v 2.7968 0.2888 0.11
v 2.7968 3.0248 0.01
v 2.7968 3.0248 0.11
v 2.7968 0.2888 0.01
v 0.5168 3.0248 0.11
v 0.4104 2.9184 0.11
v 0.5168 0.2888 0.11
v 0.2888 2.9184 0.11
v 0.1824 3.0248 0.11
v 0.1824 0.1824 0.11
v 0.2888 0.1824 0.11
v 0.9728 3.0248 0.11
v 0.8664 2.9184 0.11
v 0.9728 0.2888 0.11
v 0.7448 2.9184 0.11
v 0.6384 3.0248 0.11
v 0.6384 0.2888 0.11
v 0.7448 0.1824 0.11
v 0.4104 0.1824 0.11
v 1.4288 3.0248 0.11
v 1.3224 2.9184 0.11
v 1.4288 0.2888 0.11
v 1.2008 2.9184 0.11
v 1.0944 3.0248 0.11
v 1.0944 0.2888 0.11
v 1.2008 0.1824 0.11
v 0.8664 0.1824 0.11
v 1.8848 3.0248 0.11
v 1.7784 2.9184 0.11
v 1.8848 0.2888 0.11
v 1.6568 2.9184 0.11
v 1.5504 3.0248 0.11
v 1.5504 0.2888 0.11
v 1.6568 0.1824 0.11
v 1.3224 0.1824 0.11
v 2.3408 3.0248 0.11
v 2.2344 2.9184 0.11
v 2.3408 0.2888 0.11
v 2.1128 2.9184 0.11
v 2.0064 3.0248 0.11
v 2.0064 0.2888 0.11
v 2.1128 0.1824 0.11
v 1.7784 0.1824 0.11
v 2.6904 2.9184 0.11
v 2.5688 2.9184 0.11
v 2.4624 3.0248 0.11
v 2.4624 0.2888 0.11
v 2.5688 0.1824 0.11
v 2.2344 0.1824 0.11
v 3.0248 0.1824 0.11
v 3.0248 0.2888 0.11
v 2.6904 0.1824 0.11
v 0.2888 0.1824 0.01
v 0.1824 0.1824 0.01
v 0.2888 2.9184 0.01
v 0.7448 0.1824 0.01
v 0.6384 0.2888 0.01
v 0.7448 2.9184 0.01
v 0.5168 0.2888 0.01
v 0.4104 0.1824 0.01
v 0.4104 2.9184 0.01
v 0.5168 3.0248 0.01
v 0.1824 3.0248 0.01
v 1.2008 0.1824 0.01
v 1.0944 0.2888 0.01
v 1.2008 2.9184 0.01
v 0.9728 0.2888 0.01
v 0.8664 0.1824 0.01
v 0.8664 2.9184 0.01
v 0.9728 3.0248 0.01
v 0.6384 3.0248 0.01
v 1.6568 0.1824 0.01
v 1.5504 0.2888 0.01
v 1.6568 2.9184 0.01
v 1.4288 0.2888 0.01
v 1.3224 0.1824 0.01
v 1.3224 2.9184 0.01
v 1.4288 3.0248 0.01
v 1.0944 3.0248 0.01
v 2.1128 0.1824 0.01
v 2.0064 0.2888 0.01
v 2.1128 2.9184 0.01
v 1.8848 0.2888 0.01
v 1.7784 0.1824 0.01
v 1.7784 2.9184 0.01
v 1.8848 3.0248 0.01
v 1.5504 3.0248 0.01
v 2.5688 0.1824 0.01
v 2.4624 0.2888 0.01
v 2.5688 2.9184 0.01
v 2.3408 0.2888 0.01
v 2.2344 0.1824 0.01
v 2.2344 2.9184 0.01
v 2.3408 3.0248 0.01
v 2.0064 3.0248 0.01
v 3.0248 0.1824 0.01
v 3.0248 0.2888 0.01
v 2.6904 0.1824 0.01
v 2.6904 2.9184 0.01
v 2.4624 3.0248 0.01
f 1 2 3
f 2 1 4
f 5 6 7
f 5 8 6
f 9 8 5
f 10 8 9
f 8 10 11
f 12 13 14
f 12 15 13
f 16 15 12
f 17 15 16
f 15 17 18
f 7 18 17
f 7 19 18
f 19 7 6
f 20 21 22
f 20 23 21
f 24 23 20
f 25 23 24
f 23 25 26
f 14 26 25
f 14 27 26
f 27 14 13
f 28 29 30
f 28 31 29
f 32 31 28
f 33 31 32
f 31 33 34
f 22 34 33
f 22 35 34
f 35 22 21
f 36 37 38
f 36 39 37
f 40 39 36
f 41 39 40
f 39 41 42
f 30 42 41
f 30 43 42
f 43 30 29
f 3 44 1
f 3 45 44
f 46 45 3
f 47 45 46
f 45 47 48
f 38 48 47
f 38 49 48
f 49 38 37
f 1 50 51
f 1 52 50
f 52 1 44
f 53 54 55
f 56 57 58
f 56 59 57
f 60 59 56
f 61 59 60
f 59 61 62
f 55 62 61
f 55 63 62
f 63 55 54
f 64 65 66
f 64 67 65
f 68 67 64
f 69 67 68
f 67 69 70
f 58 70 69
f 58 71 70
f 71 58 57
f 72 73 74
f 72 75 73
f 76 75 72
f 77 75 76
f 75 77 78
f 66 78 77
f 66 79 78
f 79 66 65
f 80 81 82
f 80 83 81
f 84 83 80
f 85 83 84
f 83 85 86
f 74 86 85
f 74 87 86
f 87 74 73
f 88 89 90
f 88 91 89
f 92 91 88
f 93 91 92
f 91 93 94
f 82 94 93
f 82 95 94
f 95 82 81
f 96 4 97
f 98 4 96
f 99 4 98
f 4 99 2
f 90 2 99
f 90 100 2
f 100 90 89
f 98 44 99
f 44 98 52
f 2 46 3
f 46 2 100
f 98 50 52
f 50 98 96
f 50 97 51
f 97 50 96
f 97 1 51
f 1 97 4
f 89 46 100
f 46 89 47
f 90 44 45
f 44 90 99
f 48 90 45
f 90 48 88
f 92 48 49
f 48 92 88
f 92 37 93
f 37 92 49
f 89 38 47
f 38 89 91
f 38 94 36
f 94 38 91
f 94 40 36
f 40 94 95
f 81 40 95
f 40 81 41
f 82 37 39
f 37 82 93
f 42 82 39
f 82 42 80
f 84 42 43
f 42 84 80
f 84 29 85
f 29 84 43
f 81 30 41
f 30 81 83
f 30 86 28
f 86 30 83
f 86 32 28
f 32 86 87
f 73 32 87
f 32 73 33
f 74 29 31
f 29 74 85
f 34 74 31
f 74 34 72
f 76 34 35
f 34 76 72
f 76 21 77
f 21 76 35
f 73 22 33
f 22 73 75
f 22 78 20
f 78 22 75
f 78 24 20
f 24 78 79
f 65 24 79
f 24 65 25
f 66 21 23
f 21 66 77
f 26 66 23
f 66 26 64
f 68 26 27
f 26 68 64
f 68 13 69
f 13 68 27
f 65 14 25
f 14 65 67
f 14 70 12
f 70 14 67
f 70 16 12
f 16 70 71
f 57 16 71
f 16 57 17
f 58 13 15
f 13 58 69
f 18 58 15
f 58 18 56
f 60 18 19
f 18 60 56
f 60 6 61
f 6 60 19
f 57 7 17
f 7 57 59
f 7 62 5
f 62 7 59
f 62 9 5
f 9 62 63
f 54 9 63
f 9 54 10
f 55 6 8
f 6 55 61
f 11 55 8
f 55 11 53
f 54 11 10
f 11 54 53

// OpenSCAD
use <routing.scad>

px = 7.6e-3;
layer = 10e-3;
lpv = 20;

module valve_20px_1(xpos, ypos, zpos, orientation)
{
    
    // Parameteres
    h_fluid = 2*layer;
    t_memb = layer;
    h_air = 4*layer;
    h_total = h_fluid + t_memb + h_air; // 7*layer
    d_valve = 20*px;
    
    // Valve connection channels
    xychan0 = 6*px;
    xychan = 8*px;
    hchan = 5*layer;
    hchan_px = 8*px;
    wchan = 8*px;

    dimm        =   [  
                        [[0, 0], [-wchan/2, wchan/2], [0, hchan]], // 0
                        [[-wchan/2, wchan/2], [0, 0], [0, hchan]], // 1
                        [[-xychan/2, xychan/2], [-xychan/2, xychan/2], [0, 0]], // 2
                        [[-xychan0/2, xychan0/2], [-xychan0/2, xychan0/2], [0, 0]], // 3
                        [[-xychan/2, xychan/2], [0, hchan_px], [0, 0]], // 4
                    ];
                    
    overlap_v_xy  = 2*px;
    
    module obj(){
        // Fluid compartment
        color("CadetBlue")
        cylinder(d = d_valve, h = h_fluid);
        
        // Air compartment
        color("SteelBlue")
        translate([0,0,h_fluid + t_memb])
        cylinder(d = d_valve, h = h_air);    
            
        // Fluid in channel connection
        pt_fluid_in         = [0, -d_valve/2 + overlap_v_xy, 1*layer - hchan];
        pt_fluid_in_next    = [
                                ["+y", -21*px, 1],
                              ];
        color("Blue")
        routing(pt_fluid_in,pt_fluid_in_next, dimm);
        
        // Fluid out channel connection
        pt_fluid_out        = [0, d_valve/2 - overlap_v_xy, 1*layer - hchan];
        pt_fluid_out_next   = [
                                ["+y", 21*px, 1],
                              ];
        color("Red")
        routing(pt_fluid_out,pt_fluid_out_next, dimm);
        
        // Air control channel connection
        pt_air_control      = [-d_valve/2 - xychan/2 + 6*px, 0, h_total];
        pt_air_control_next = [
                                ["+zx", [9*layer, -21*px]],
                              ];
        
        color("Red")
        routing(pt_air_control,pt_air_control_next, dimm);
        
        // Air flushing channel connection
        pt_air_flush        = [d_valve/2 + xychan/2 - 6*px, 0, h_total];
        pt_air_flush_next   = [
                                ["+zx", [9*layer, 21*px]],
                              ];
        color("Blue")
        routing(pt_air_flush,pt_air_flush_next, dimm);
    }
    
    if (orientation == "N"){
        rotate(270)
        translate([-25*px*2 - ypos*px, 30*px*2 + xpos*px, 4*layer + zpos*layer])
        obj();
    }
    if (orientation == "FN"){
        mirror([1, 0 , 0])
        rotate(270)
        translate([-25*px*2 - ypos*px, -30*px*2 - xpos*px, 4*layer + zpos*layer])
        obj();
    }
    if (orientation == "FS"){
        mirror([0, 1, 0])
        rotate(270)
        translate([25*px*2 + ypos*px, 30*px*2 + xpos*px, 4*layer + zpos*layer])
        obj();
    }
    if (orientation == "S"){
        mirror([0, 1, 0])
        mirror([1, 0 , 0])
        rotate(270)
        translate([25*px*2 + ypos*px, -30*px*2 - xpos*px, 4*layer + zpos*layer])
        obj();
    }
    
}
module valve_20px4way_0(xpos, ypos, zpos, orientation)
{
    
    // Parameteres
    h_fluid = 2*layer;
    t_memb = layer;
    h_air = 4*layer;
    h_total = h_fluid + t_memb + h_air; // 7*layer
    d_valve = 20*px;
    
    // Valve connection channels
    xychan0 = 6*px;
    xychan = 8*px;
    hchan = 5*layer;
    hchan_px = 8*px;
    wchan = 8*px;

    dimm        =   [  
                        [[0, 0], [-wchan/2, wchan/2], [0, hchan]], // 0
                        [[-wchan/2, wchan/2], [0, 0], [0, hchan]], // 1
                        [[-xychan/2, xychan/2], [-xychan/2, xychan/2], [0, 0]], // 2
                        [[-xychan0/2, xychan0/2], [-xychan0/2, xychan0/2], [0, 0]], // 3
                        [[-xychan/2, xychan/2], [0, hchan_px], [0, 0]], // 4
                    ];
                    
    overlap_v_xy  = 2*px;
    
    module obj(){
        // Fluid compartment
        color("CadetBlue")
        cylinder(d = d_valve, h = h_fluid);
        
        // Air compartment
        color("SteelBlue")
        translate([0,0,h_fluid + t_memb])
        cylinder(d = d_valve, h = h_air);    
            
        // Fluid in channel connection
        pt_fluid_in         = [0, -d_valve/2 + overlap_v_xy, 1*layer - hchan];
        pt_fluid_in_next    = [
                                ["+y", -21*px, 1],
                              ];
        color("Blue")
        routing(pt_fluid_in,pt_fluid_in_next, dimm);
        
        // Fluid out channel connection
        pt_fluid_out        = [0, d_valve/2 - overlap_v_xy, 1*layer - hchan];
        pt_fluid_out_next   = [
                                ["+y", 21*px, 1],
                              ];
        color("Red")
        routing(pt_fluid_out,pt_fluid_out_next, dimm);
        
        rotate(90){
            // Fluid in channel connection
            pt_fluid_in         =   [0, -d_valve/2 + overlap_v_xy, 1*layer - hchan];
            pt_fluid_in_next    =   [
                                        ["+y", -21*px, 1],
                                    ];
            
            routing(pt_fluid_in,pt_fluid_in_next, dimm);
        
            // Fluid out channel connection
            pt_fluid_out        =   [0, d_valve/2 - overlap_v_xy, 1*layer - hchan];
            pt_fluid_out_next   =   [
                                        ["+y", 21*px, 1],
                                    ];
            
            routing(pt_fluid_out,pt_fluid_out_next, dimm);
        }
        
        // Air control channel connection
        pt_air_control      = [-d_valve/2 - xychan/2 + 6*px, 0, h_total];
        pt_air_control_next = [
                                ["+zx", [9*layer, -21*px]],
                              ];
        
        color("Red")
        routing(pt_air_control,pt_air_control_next, dimm);
        
        // Air flushing channel connection
        pt_air_flush        = [d_valve/2 + xychan/2 - 6*px, 0, h_total];
        pt_air_flush_next   = [
                                ["+zx", [9*layer, 21*px]],
                              ];
        color("Blue")
        routing(pt_air_flush,pt_air_flush_next, dimm);
    }
    
    if (orientation == "N"){
        rotate(270)
        translate([-25*px*2 - ypos*px, 25*px*2 + xpos*px, 4*layer + zpos*layer])
        obj();
    }
    if (orientation == "FN"){
        mirror([1, 0 , 0])
        rotate(270)
        translate([-25*px*2 - ypos*px, -25*px*2 - xpos*px, 4*layer + zpos*layer])
        obj();
    }
    if (orientation == "FS"){
        mirror([0, 1, 0])
        rotate(270)
        translate([25*px*2 + ypos*px, 25*px*2 + xpos*px, 4*layer + zpos*layer])
        obj();
    }
    if (orientation == "S"){
        mirror([0, 1, 0])
        mirror([1, 0 , 0])
        rotate(270)
        translate([25*px*2 + ypos*px, -25*px*2 - xpos*px, 4*layer + zpos*layer])
        obj();
    }
    
}
module serpentine_300px_0(xpos, ypos, zpos, orientation)
{
    
    // Sub-modules
    module obj(){
        translate([23*px, 23*px, 0])       
        routing(
            dimm = [
                    [[0, 0], [0, 14*px], [0, 10*layer]],
                    [[0, 14*px], [0, 0], [0, 10*layer]]
                    ],
            p0 = [0, 0, 0],
            pf = [
                    ["+yx", [360*px, 30*px], [1, 0]],
                    ["+yx", [-360*px, 30*px], [1, 0]],
                    ["+yx", [360*px, 30*px], [1, 0]],
                    ["+yx", [-360*px, 30*px], [1, 0]],
                    ["+yx", [360*px, 30*px], [1, 0]],
                    ["+yx", [-360*px, 30*px], [1, 0]],
                    ["+yx", [360*px, 30*px], [1, 0]],
                    ["+yx", [-360*px, 30*px], [1, 0]],
                    ["+yx", [360*px, 30*px], [1, 0]],
                    ["+yx", [-360*px, 30*px], [1, 0]],
                    ["+yx", [360*px, 30*px], [1, 0]],
                    ["+yx", [-360*px, 30*px+14*px], [1, 0]]
                    ]
        );
        
    }
    
    if (orientation == "N"){
        translate([xpos*px, ypos*px, zpos*layer])
        obj();
    }
        if (orientation == "FN"){
        mirror([1, 0, 0])
        translate([-14*30*px - xpos*px, ypos*px, zpos*layer])
        obj();
    }
    if (orientation == "FS"){
        mirror([0, 1, 0])
        translate([xpos*px, -14*30*px - ypos*px, zpos*layer])
        obj();
    }
    if (orientation == "S"){
        mirror([0, 1, 0])
        mirror([1, 0, 0])
        translate([-14*30*px - xpos*px, -14*30*px - ypos*px, zpos*layer])
        obj();
    }
    
}
serpentine_300px_0(1,1,1,"N");

module serpentine_100px_0(xpos, ypos, zpos, orientation)
{
    
    // Sub-modules
    module obj(){
        translate([23*px, 23*px, 0])       
        routing(
            dimm = [
                    [[0, 0], [0, 14*px], [0, 10*layer]],
                    [[0, 14*px], [0, 0], [0, 10*layer]]
                    ],
            p0 = [0, 0, 0],
            pf = [
                    ["+yx", [120*px, 30*px], [1, 0]],
                    ["+yx", [-120*px, 30*px], [1, 0]],
                    ["+yx", [120*px, 30*px], [1, 0]],
                    ["+yx", [-120*px, 30*px+14*px], [1, 0]]
                    ]
        );
        
    }
    
    if (orientation == "N"){
        translate([xpos*px, ypos*px, zpos*layer])
        obj();
    }
        if (orientation == "FN"){
        mirror([1, 0, 0])
        translate([-6*30*px - xpos*px, ypos*px, zpos*layer])
        obj();
    }
    if (orientation == "FS"){
        mirror([0, 1, 0])
        translate([xpos*px, -6*30*px - ypos*px, zpos*layer])
        obj();
    }
    if (orientation == "S"){
        mirror([0, 1, 0])
        mirror([1, 0, 0])
        translate([-6*30*px - xpos*px, -6*30*px - ypos*px, zpos*layer])
        obj();
    }
    
}
module serpentine_200_100px_0(xpos, ypos, zpos, orientation)
{
    
    // Sub-modules
    module obj(){
        translate([23*px, 23*px, 0])       
        routing(
            dimm = [
                    [[0, 0], [0, 14*px], [0, 10*layer]],
                    [[0, 14*px], [0, 0], [0, 10*layer]]
                    ],
            p0 = [0, 0, 0],
            pf = [
                    ["+yx", [120*px, 30*px], [1, 0]],
                    ["+yx", [-120*px, 30*px], [1, 0]],
                    ["+yx", [120*px, 30*px], [1, 0]],                 
                    ["+yx", [-120*px, 30*px], [1, 0]],
                    ["+yx", [120*px, 30*px], [1, 0]],
                    ["+yx", [-120*px, 30*px], [1, 0]],
                    ["+yx", [120*px, 30*px], [1, 0]],
                    ["+yx", [-120*px, 30*px+14*px], [1, 0]],
                    ]
        );
        
    }
    
    if (orientation == "N"){
        translate([xpos*px, ypos*px, zpos*layer])
        obj();
    }
        if (orientation == "FN"){
        mirror([1, 0, 0])
        translate([-10*30*px - xpos*px, ypos*px, zpos*layer])
        obj();
    }
    if (orientation == "FS"){
        mirror([0, 1, 0])
        translate([xpos*px, -6*30*px - ypos*px, zpos*layer])
        obj();
    }
    if (orientation == "S"){
        mirror([0, 1, 0])
        mirror([1, 0, 0])
        translate([-10*30*px - xpos*px, -6*30*px - ypos*px, zpos*layer])
        obj();
    }
    
}
module serpentine_25px_0(xpos, ypos, zpos, orientation)
{
    
    // Sub-modules
    module obj(){
        translate([23*px, 23*px, 0])       
        routing(
            dimm = [
                    [[0, 0], [0, 14*px], [0, 10*layer]],
                    [[0, 14*px], [0, 0], [0, 10*layer]]
                    ],
            p0 = [0, 0, 0],
            pf = [
                    ["+yx", [30*px, 30*px+14*px], [1, 0]]
                    ]
        );
        
    }
    
    if (orientation == "N"){
        translate([xpos*px, ypos*px, zpos*layer])
        obj();
    }
        if (orientation == "FN"){
        mirror([1, 0, 0])
        translate([-3*30*px - xpos*px, ypos*px, zpos*layer])
        obj();
    }
    if (orientation == "FS"){
        mirror([0, 1, 0])
        translate([xpos*px, -3*30*px - ypos*px, zpos*layer])
        obj();
    }
    if (orientation == "S"){
        mirror([0, 1, 0])
        mirror([1, 0, 0])
        translate([-3*30*px - xpos*px, -3*30*px - ypos*px, zpos*layer])
        obj();
    }
    
}
module serpentine_150px_0(xpos, ypos, zpos, orientation)
{
    
    // Sub-modules
    module obj(){
        translate([23*px, 23*px, 0])       
        routing(
            dimm = [
                    [[0, 0], [0, 14*px], [0, 10*layer]],
                    [[0, 14*px], [0, 0], [0, 10*layer]]
                    ],
            p0 = [0, 0, 0],
            pf = [
                    ["+yx", [180*px, 30*px], [1, 0]],
                    ["+yx", [-180*px, 30*px], [1, 0]],
                    ["+yx", [180*px, 30*px], [1, 0]],
                    ["+yx", [-180*px, 30*px], [1, 0]],
                    ["+yx", [180*px, 30*px], [1, 0]],
                    ["+yx", [-180*px, 30*px+14*px], [1, 0]]
                    ]
        );
        
    }
    
    if (orientation == "N"){
        translate([xpos*px, ypos*px, zpos*layer])
        obj();
    }
        if (orientation == "FN"){
        mirror([1, 0, 0])
        translate([-8*30*px - xpos*px, ypos*px, zpos*layer])
        obj();
    }
    if (orientation == "FS"){
        mirror([0, 1, 0])
        translate([xpos*px, -8*30*px - ypos*px, zpos*layer])
        obj();
    }
    if (orientation == "S"){
        mirror([0, 1, 0])
        mirror([1, 0, 0])
        translate([-8*30*px - xpos*px, -8*30*px - ypos*px, zpos*layer])
        obj();
    }
    
}
module serpentine_200px_0(xpos, ypos, zpos, orientation)
{
    
    // Sub-modules
    module obj(){
        translate([23*px, 23*px, 0])       
        routing(
            dimm = [
                    [[0, 0], [0, 14*px], [0, 10*layer]],
                    [[0, 14*px], [0, 0], [0, 10*layer]]
                    ],
            p0 = [0, 0, 0],
            pf = [
                    ["+yx", [240*px, 30*px], [1, 0]],
                    ["+yx", [-240*px, 30*px], [1, 0]],
                    ["+yx", [240*px, 30*px], [1, 0]],
                    ["+yx", [-240*px, 30*px], [1, 0]],
                    ["+yx", [240*px, 30*px], [1, 0]],
                    ["+yx", [-240*px, 30*px], [1, 0]],
                    ["+yx", [240*px, 30*px], [1, 0]],
                    ["+yx", [-240*px, 30*px+14*px], [1, 0]]
                    ]
        );
        
    }
    
    if (orientation == "N"){
        translate([xpos*px, ypos*px, zpos*layer])
        obj();
    }
        if (orientation == "FN"){
        mirror([1, 0, 0])
        translate([-10*30*px - xpos*px, ypos*px, zpos*layer])
        obj();
    }
    if (orientation == "FS"){
        mirror([0, 1, 0])
        translate([xpos*px, -10*30*px - ypos*px, zpos*layer])
        obj();
    }
    if (orientation == "S"){
        mirror([0, 1, 0])
        mirror([1, 0, 0])
        translate([-10*30*px - xpos*px, -10*30*px - ypos*px, zpos*layer])
        obj();
    }
    
}
module serpentine_300px_4(xpos, ypos, zpos, orientation)
{
    
    // Sub-modules
    module obj(){
        translate([23*px+30*px, 23*px, 0]){     
            routing(
                dimm = [
                        [[0, 0], [0, 14*px], [0, 10*layer]],
                        [[0, 14*px], [0, 0], [0, 10*layer]],
                        [[0, 14*px], [0, 14*px], [0, 0]]
                        ],
                p0 = [-30*px, 0, lpv*layer],
                pf = [
                        ["+x", 30*px, 0],
                        ["+yx", [360*px, 30*px], [1, 0]],
                        ["+yx", [-360*px, 30*px], [1, 0]],
                        ["+yx", [360*px, 30*px], [1, 0]],
                        ["+yx", [-360*px, 30*px], [1, 0]],
                        ["+yx", [360*px, 30*px], [1, 0]],
                        ["+yx", [-360*px, 30*px], [1, 0]],
                        ["+yx", [360*px, 30*px], [1, 0]],
                        ["+yx", [-360*px, 30*px], [1, 0]],
                        ["+yx", [360*px, 30*px], [1, 0]],
                        ["+yx", [-360*px, 30*px], [1, 0]],
                        ["+yx", [360*px, 30*px], [1, 0]],
                        ["+yz", [-360*px, lpv*layer], [1, 2]]
                        ]
            );
            routing(
                dimm = [
                        [[0, 0], [0, 14*px], [0, 10*layer]],
                        [[0, 14*px], [0, 0], [0, 10*layer]],
                        [[0, 14*px], [0, 14*px], [0, 0]]
                        ],
                p0 = [11*30*px, 0, 2*lpv*layer],
                pf = [
                        ["+yx", [360*px, -30*px], [1, 0]],
                        ["+yx", [-360*px, -30*px], [1, 0]],
                        ["+yx", [360*px, -30*px], [1, 0]],
                        ["+yx", [-360*px, -30*px], [1, 0]],
                        ["+yx", [360*px, -30*px], [1, 0]],
                        ["+yx", [-360*px, -30*px], [1, 0]],
                        ["+yx", [360*px, -30*px], [1, 0]],
                        ["+yx", [-360*px, -30*px], [1, 0]],
                        ["+yx", [360*px, -30*px], [1, 0]],
                        ["+yx", [-360*px, -30*px], [1, 0]],
                        ["+yx", [360*px, -30*px], [1, 0]],
                        ["+yz", [-360*px, lpv*layer], [1, 2]]
                        ]
            );
            routing(
                dimm = [
                        [[0, 0], [0, 14*px], [0, 10*layer]],
                        [[0, 14*px], [0, 0], [0, 10*layer]],
                        [[0, 14*px], [0, 14*px], [0, 0]]
                        ],
                p0 = [0, 0, 3*lpv*layer],
                pf = [
                        ["+yx", [360*px, 30*px], [1, 0]],
                        ["+yx", [-360*px, 30*px], [1, 0]],
                        ["+yx", [360*px, 30*px], [1, 0]],
                        ["+yx", [-360*px, 30*px], [1, 0]],
                        ["+yx", [360*px, 30*px], [1, 0]],
                        ["+yx", [-360*px, 30*px], [1, 0]],
                        ["+yx", [360*px, 30*px], [1, 0]],
                        ["+yx", [-360*px, 30*px], [1, 0]],
                        ["+yx", [360*px, 30*px], [1, 0]],
                        ["+yx", [-360*px, 30*px], [1, 0]],
                        ["+yx", [360*px, 30*px], [1, 0]],
                        ["+yz", [-360*px, lpv*layer], [1, 2]]
                        ]
            );
            routing(
                dimm = [
                        [[0, 0], [0, 14*px], [0, 10*layer]],
                        [[0, 14*px], [0, 0], [0, 10*layer]],
                        [[0, 14*px], [0, 14*px], [0, 0]]
                        ],
                p0 = [11*30*px, 0, 4*lpv*layer],
                pf = [
                        ["+yx", [360*px, -30*px], [1, 0]],
                        ["+yx", [-360*px, -30*px], [1, 0]],
                        ["+yx", [360*px, -30*px], [1, 0]],
                        ["+yx", [-360*px, -30*px], [1, 0]],
                        ["+yx", [360*px, -30*px], [1, 0]],
                        ["+yx", [-360*px, -30*px], [1, 0]],
                        ["+yx", [360*px, -30*px], [1, 0]],
                        ["+yx", [-360*px, -30*px], [1, 0]],
                        ["+yx", [360*px, -30*px], [1, 0]],
                        ["+yx", [-360*px, -30*px], [1, 0]],
                        ["+yx", [360*px, -30*px], [1, 0]],
                        ["+yz", [-360*px, lpv*layer], [1, 2]]
                        ]
            );
            routing(
                dimm = [
                        [[0, 0], [0, 14*px], [0, 10*layer]],
                        [[0, 14*px], [0, 0], [0, 10*layer]],
                        [[0, 14*px], [0, 14*px], [0, 0]]
                        ],
                p0 = [0, 0, 5*lpv*layer],
                pf = [
                        ["+yx", [360*px, 30*px], [1, 0]],
                        ["+yx", [-360*px, 30*px], [1, 0]],
                        ["+yx", [360*px, 30*px], [1, 0]],
                        ["+yx", [-360*px, 30*px], [1, 0]],
                        ["+yx", [360*px, 30*px], [1, 0]],
                        ["+yx", [-360*px, 30*px], [1, 0]],
                        ["+yx", [360*px, 30*px], [1, 0]],
                        ["+yx", [-360*px, 30*px], [1, 0]],
                        ["+yx", [360*px, 30*px], [1, 0]],
                        ["+yx", [-360*px, 30*px], [1, 0]],
                        ["+yx", [360*px, 30*px], [1, 0]],
                        ["+yx", [-360*px, 25*px+14*px], [1, 0]]
                        ]
            );
        }
        
    }
    
    if (orientation == "N"){
        translate([xpos*px, ypos*px, zpos*layer])
        obj();
    }
        if (orientation == "FN"){
        mirror([1, 0, 0])
        translate([-15*30*px - xpos*px, ypos*px, zpos*layer])
        obj();
    }
    if (orientation == "FS"){
        mirror([0, 1, 0])
        translate([xpos*px, -14*30*px - ypos*px, zpos*layer])
        obj();
    }
    if (orientation == "S"){
        mirror([0, 1, 0])
        mirror([1, 0, 0])
        translate([-15*30*px - xpos*px, -14*30*px - ypos*px, zpos*layer])
        obj();
    }
    
}
module serpentine_75px_0(xpos, ypos, zpos, orientation)
{
    
    // Sub-modules
    module obj(){
        translate([23*px, 23*px, 0])       
        routing(
            dimm = [
                    [[0, 0], [0, 14*px], [0, 10*layer]],
                    [[0, 14*px], [0, 0], [0, 10*layer]]
                    ],
            p0 = [0, 0, 0],
            pf = [
                    ["+yx", [90*px, 30*px], [1, 0]],
                    ["+yx", [-90*px, 30*px], [1, 0]],
                    ["+yx", [90*px, 30*px+14*px], [1, 0]]
                    ]
        );
        
    }
    
    if (orientation == "N"){
        translate([xpos*px, ypos*px, zpos*layer])
        obj();
    }
        if (orientation == "FN"){
        mirror([1, 0, 0])
        translate([-5*30*px - xpos*px, ypos*px, zpos*layer])
        obj();
    }
    if (orientation == "FS"){
        mirror([0, 1, 0])
        translate([xpos*px, -5*30*px - ypos*px, zpos*layer])
        obj();
    }
    if (orientation == "S"){
        mirror([0, 1, 0])
        mirror([1, 0, 0])
        translate([-5*30*px - xpos*px, -5*30*px - ypos*px, zpos*layer])
        obj();
    }
    
}
module serpentine_300px_1(xpos, ypos, zpos, orientation)
{
    
    // Sub-modules
    module obj(){
        translate([23*px+30*px, 23*px, 0]){     
            routing(
                dimm = [
                        [[0, 0], [0, 14*px], [0, 10*layer]],
                        [[0, 14*px], [0, 0], [0, 10*layer]],
                        [[0, 14*px], [0, 14*px], [0, 0]]
                        ],
                p0 = [0, 0, lpv*layer],
                pf = [
                        ["+yx", [360*px, 30*px], [1, 0]],
                        ["+yx", [-360*px, 30*px], [1, 0]],
                        ["+yx", [360*px, 30*px], [1, 0]],
                        ["+yx", [-360*px, 30*px], [1, 0]],
                        ["+yx", [360*px, 30*px], [1, 0]],
                        ["+yx", [-360*px, 30*px], [1, 0]],
                        ["+yx", [360*px, 30*px], [1, 0]],
                        ["+yx", [-360*px, 30*px], [1, 0]],
                        ["+yx", [360*px, 30*px], [1, 0]],
                        ["+yx", [-360*px, 30*px], [1, 0]],
                        ["+yx", [360*px, 30*px], [1, 0]],
                        ["+yz", [-360*px, lpv*layer], [1, 2]]
                        ]
            );
            routing(
                dimm = [
                        [[0, 0], [0, 14*px], [0, 10*layer]],
                        [[0, 14*px], [0, 0], [0, 10*layer]],
                        [[0, 14*px], [0, 14*px], [0, 0]]
                        ],
                p0 = [11*30*px, 0, 2*lpv*layer],
                pf = [
                        ["+yx", [360*px, -30*px], [1, 0]],
                        ["+yx", [-360*px, -30*px], [1, 0]],
                        ["+yx", [360*px, -30*px], [1, 0]],
                        ["+yx", [-360*px, -30*px], [1, 0]],
                        ["+yx", [360*px, -30*px], [1, 0]],
                        ["+yx", [-360*px, -30*px], [1, 0]],
                        ["+yx", [360*px, -30*px], [1, 0]],
                        ["+yx", [-360*px, -30*px], [1, 0]],
                        ["+yx", [360*px, -30*px], [1, 0]],
                        ["+yx", [-360*px, -30*px], [1, 0]],
                        ["+yx", [360*px, -30*px], [1, 0]],
                        ["+yx", [-360*px, -30*px], [1, 0]]
                        ]
            );
        }
        
    }
    
    if (orientation == "N"){
        translate([xpos*px, ypos*px, zpos*layer])
        obj();
    }
        if (orientation == "FN"){
        mirror([1, 0, 0])
        translate([-14*30*px - xpos*px, ypos*px, zpos*layer])
        obj();
    }
    if (orientation == "FS"){
        mirror([0, 1, 0])
        translate([xpos*px, -14*30*px - ypos*px, zpos*layer])
        obj();
    }
    if (orientation == "S"){
        mirror([0, 1, 0])
        mirror([1, 0, 0])
        translate([-14*30*px - xpos*px, -14*30*px - ypos*px, zpos*layer])
        obj();
    }
    
}
module serpentine_300px_3(xpos, ypos, zpos, orientation)
{
    
    // Sub-modules
    module obj(){
        translate([23*px+30*px, 23*px, 0]){     
            routing(
                dimm = [
                        [[0, 0], [0, 14*px], [0, 10*layer]],
                        [[0, 14*px], [0, 0], [0, 10*layer]],
                        [[0, 14*px], [0, 14*px], [0, 0]]
                        ],
                p0 = [0, 0, lpv*layer],
                pf = [
                        ["+yx", [360*px, 30*px], [1, 0]],
                        ["+yx", [-360*px, 30*px], [1, 0]],
                        ["+yx", [360*px, 30*px], [1, 0]],
                        ["+yx", [-360*px, 30*px], [1, 0]],
                        ["+yx", [360*px, 30*px], [1, 0]],
                        ["+yx", [-360*px, 30*px], [1, 0]],
                        ["+yx", [360*px, 30*px], [1, 0]],
                        ["+yx", [-360*px, 30*px], [1, 0]],
                        ["+yx", [360*px, 30*px], [1, 0]],
                        ["+yx", [-360*px, 30*px], [1, 0]],
                        ["+yx", [360*px, 30*px], [1, 0]],
                        ["+yz", [-360*px, lpv*layer], [1, 2]]
                        ]
            );
            routing(
                dimm = [
                        [[0, 0], [0, 14*px], [0, 10*layer]],
                        [[0, 14*px], [0, 0], [0, 10*layer]],
                        [[0, 14*px], [0, 14*px], [0, 0]]
                        ],
                p0 = [11*30*px, 0, 2*lpv*layer],
                pf = [
                        ["+yx", [360*px, -30*px], [1, 0]],
                        ["+yx", [-360*px, -30*px], [1, 0]],
                        ["+yx", [360*px, -30*px], [1, 0]],
                        ["+yx", [-360*px, -30*px], [1, 0]],
                        ["+yx", [360*px, -30*px], [1, 0]],
                        ["+yx", [-360*px, -30*px], [1, 0]],
                        ["+yx", [360*px, -30*px], [1, 0]],
                        ["+yx", [-360*px, -30*px], [1, 0]],
                        ["+yx", [360*px, -30*px], [1, 0]],
                        ["+yx", [-360*px, -30*px], [1, 0]],
                        ["+yx", [360*px, -30*px], [1, 0]],
                        ["+yz", [-360*px, lpv*layer], [1, 2]]
                        ]
            );
            routing(
                dimm = [
                        [[0, 0], [0, 14*px], [0, 10*layer]],
                        [[0, 14*px], [0, 0], [0, 10*layer]],
                        [[0, 14*px], [0, 14*px], [0, 0]]
                        ],
                p0 = [0, 0, 3*lpv*layer],
                pf = [
                        ["+yx", [360*px, 30*px], [1, 0]],
                        ["+yx", [-360*px, 30*px], [1, 0]],
                        ["+yx", [360*px, 30*px], [1, 0]],
                        ["+yx", [-360*px, 30*px], [1, 0]],
                        ["+yx", [360*px, 30*px], [1, 0]],
                        ["+yx", [-360*px, 30*px], [1, 0]],
                        ["+yx", [360*px, 30*px], [1, 0]],
                        ["+yx", [-360*px, 30*px], [1, 0]],
                        ["+yx", [360*px, 30*px], [1, 0]],
                        ["+yx", [-360*px, 30*px], [1, 0]],
                        ["+yx", [360*px, 30*px], [1, 0]],
                        ["+yz", [-360*px, lpv*layer], [1, 2]]
                        ]
            );
            routing(
                dimm = [
                        [[0, 0], [0, 14*px], [0, 10*layer]],
                        [[0, 14*px], [0, 0], [0, 10*layer]],
                        [[0, 14*px], [0, 14*px], [0, 0]]
                        ],
                p0 = [11*30*px, 0, 4*lpv*layer],
                pf = [
                        ["+yx", [360*px, -30*px], [1, 0]],
                        ["+yx", [-360*px, -30*px], [1, 0]],
                        ["+yx", [360*px, -30*px], [1, 0]],
                        ["+yx", [-360*px, -30*px], [1, 0]],
                        ["+yx", [360*px, -30*px], [1, 0]],
                        ["+yx", [-360*px, -30*px], [1, 0]],
                        ["+yx", [360*px, -30*px], [1, 0]],
                        ["+yx", [-360*px, -30*px], [1, 0]],
                        ["+yx", [360*px, -30*px], [1, 0]],
                        ["+yx", [-360*px, -30*px], [1, 0]],
                        ["+yx", [360*px, -30*px], [1, 0]],
                        ["+yx", [-360*px, -30*px], [1, 0]]
                        ]
            );
        }
        
    }
    
    if (orientation == "N"){
        translate([xpos*px, ypos*px, zpos*layer])
        obj();
    }
        if (orientation == "FN"){
        mirror([1, 0, 0])
        translate([-14*30*px - xpos*px, ypos*px, zpos*layer])
        obj();
    }
    if (orientation == "FS"){
        mirror([0, 1, 0])
        translate([xpos*px, -14*30*px - ypos*px, zpos*layer])
        obj();
    }
    if (orientation == "S"){
        mirror([0, 1, 0])
        mirror([1, 0, 0])
        translate([-14*30*px - xpos*px, -14*30*px - ypos*px, zpos*layer])
        obj();
    }
    
}
module serpentine_50px_0(xpos, ypos, zpos, orientation)
{
    
    // Sub-modules
    module obj(){
        translate([23*px, 23*px, 0])       
        routing(
            dimm = [
                    [[0, 0], [0, 14*px], [0, 10*layer]],
                    [[0, 14*px], [0, 0], [0, 10*layer]]
                    ],
            p0 = [0, 0, 0],
            pf = [
                    ["+yx", [60*px, 30*px], [1, 0]],
                    ["+yx", [-60*px, 30*px+14*px], [1, 0]]
                    ]
        );
        
    }
    
    if (orientation == "N"){
        translate([xpos*px, ypos*px, zpos*layer])
        obj();
    }
        if (orientation == "FN"){
        mirror([1, 0, 0])
        translate([-4*30*px - xpos*px, ypos*px, zpos*layer])
        obj();
    }
    if (orientation == "FS"){
        mirror([0, 1, 0])
        translate([xpos*px, -4*30*px - ypos*px, zpos*layer])
        obj();
    }
    if (orientation == "S"){
        mirror([0, 1, 0])
        mirror([1, 0, 0])
        translate([-4*30*px - xpos*px, -4*30*px - ypos*px, zpos*layer])
        obj();
    }
    
}
module serpentine_300px_2(xpos, ypos, zpos, orientation)
{
    
    // Sub-modules
    module obj(){
        translate([23*px+30*px, 23*px, 0]){     
            routing(
                dimm = [
                        [[0, 0], [0, 14*px], [0, 10*layer]],
                        [[0, 14*px], [0, 0], [0, 10*layer]],
                        [[0, 14*px], [0, 14*px], [0, 0]]
                        ],
                p0 = [-30*px, 0, lpv*layer],
                pf = [
                        ["+x", 30*px, 0],
                        ["+yx", [360*px, 30*px], [1, 0]],
                        ["+yx", [-360*px, 30*px], [1, 0]],
                        ["+yx", [360*px, 30*px], [1, 0]],
                        ["+yx", [-360*px, 30*px], [1, 0]],
                        ["+yx", [360*px, 30*px], [1, 0]],
                        ["+yx", [-360*px, 30*px], [1, 0]],
                        ["+yx", [360*px, 30*px], [1, 0]],
                        ["+yx", [-360*px, 30*px], [1, 0]],
                        ["+yx", [360*px, 30*px], [1, 0]],
                        ["+yx", [-360*px, 30*px], [1, 0]],
                        ["+yx", [360*px, 30*px], [1, 0]],
                        ["+yz", [-360*px, lpv*layer], [1, 2]]
                        ]
            );
            routing(
                dimm = [
                        [[0, 0], [0, 14*px], [0, 10*layer]],
                        [[0, 14*px], [0, 0], [0, 10*layer]],
                        [[0, 14*px], [0, 14*px], [0, 0]]
                        ],
                p0 = [11*30*px, 0, 2*lpv*layer],
                pf = [
                        ["+yx", [360*px, -30*px], [1, 0]],
                        ["+yx", [-360*px, -30*px], [1, 0]],
                        ["+yx", [360*px, -30*px], [1, 0]],
                        ["+yx", [-360*px, -30*px], [1, 0]],
                        ["+yx", [360*px, -30*px], [1, 0]],
                        ["+yx", [-360*px, -30*px], [1, 0]],
                        ["+yx", [360*px, -30*px], [1, 0]],
                        ["+yx", [-360*px, -30*px], [1, 0]],
                        ["+yx", [360*px, -30*px], [1, 0]],
                        ["+yx", [-360*px, -30*px], [1, 0]],
                        ["+yx", [360*px, -30*px], [1, 0]],
                        ["+yz", [-360*px, lpv*layer], [1, 2]]
                        ]
            );
            routing(
                dimm = [
                        [[0, 0], [0, 14*px], [0, 10*layer]],
                        [[0, 14*px], [0, 0], [0, 10*layer]],
                        [[0, 14*px], [0, 14*px], [0, 0]]
                        ],
                p0 = [0, 0, 3*lpv*layer],
                pf = [
                        ["+yx", [360*px, 30*px], [1, 0]],
                        ["+yx", [-360*px, 30*px], [1, 0]],
                        ["+yx", [360*px, 30*px], [1, 0]],
                        ["+yx", [-360*px, 30*px], [1, 0]],
                        ["+yx", [360*px, 30*px], [1, 0]],
                        ["+yx", [-360*px, 30*px], [1, 0]],
                        ["+yx", [360*px, 30*px], [1, 0]],
                        ["+yx", [-360*px, 30*px], [1, 0]],
                        ["+yx", [360*px, 30*px], [1, 0]],
                        ["+yx", [-360*px, 30*px], [1, 0]],
                        ["+yx", [360*px, 30*px], [1, 0]],
                        ["+yx", [-360*px, 30*px+14*px], [1, 0]]
                        ]
            );
        }
        
    }
    
    if (orientation == "N"){
        translate([xpos*px, ypos*px, zpos*layer])
        obj();
    }
        if (orientation == "FN"){
        mirror([1, 0, 0])
        translate([-15*30*px - xpos*px, ypos*px, zpos*layer])
        obj();
    }
    if (orientation == "FS"){
        mirror([0, 1, 0])
        translate([xpos*px, -14*30*px - ypos*px, zpos*layer])
        obj();
    }
    if (orientation == "S"){
        mirror([0, 1, 0])
        mirror([1, 0, 0])
        translate([-15*30*px - xpos*px, -14*30*px - ypos*px, zpos*layer])
        obj();
    }
    
}
module serpentine_200px_3(xpos, ypos, zpos, orientation)
{
    
    // Sub-modules
    module obj(){
        translate([23*px+30*px, 23*px, 0]){      
            routing(
                dimm = [
                        [[0, 0], [0, 14*px], [0, 10*layer]],
                        [[0, 14*px], [0, 0], [0, 10*layer]],
                        [[0, 14*px], [0, 14*px], [0, 0]]
                        ],
                p0 = [-30*px, 0, lpv*layer],
                pf = [
                        ["+x", 30*px, 0],
                        ["+yx", [240*px, 30*px], [1, 0]],
                        ["+yx", [-240*px, 30*px], [1, 0]],
                        ["+yx", [240*px, 30*px], [1, 0]],
                        ["+yx", [-240*px, 30*px], [1, 0]],
                        ["+yx", [240*px, 30*px], [1, 0]],
                        ["+yx", [-240*px, 30*px], [1, 0]],
                        ["+yx", [240*px, 30*px], [1, 0]],
                        ["+yz", [-240*px, lpv*layer], [1, 2]]
                        ]
            );
            routing(
                dimm = [
                        [[0, 0], [0, 14*px], [0, 10*layer]],
                        [[0, 14*px], [0, 0], [0, 10*layer]],
                        [[0, 14*px], [0, 14*px], [0, 0]]
                        ],
                p0 = [7*30*px, 0, 2*lpv*layer],
                pf = [
                        ["+yx", [240*px, -30*px], [1, 0]],
                        ["+yx", [-240*px, -30*px], [1, 0]],
                        ["+yx", [240*px, -30*px], [1, 0]],
                        ["+yx", [-240*px, -30*px], [1, 0]],
                        ["+yx", [240*px, -30*px], [1, 0]],
                        ["+yx", [-240*px, -30*px], [1, 0]],
                        ["+yx", [240*px, -30*px], [1, 0]],
                        ["+yz", [-240*px, lpv*layer], [1, 2]]
                        ]
            );
            routing(
                dimm = [
                        [[0, 0], [0, 14*px], [0, 10*layer]],
                        [[0, 14*px], [0, 0], [0, 10*layer]],
                        [[0, 14*px], [0, 14*px], [0, 0]]
                        ],
                p0 = [0, 0, 3*lpv*layer],
                pf = [
                        ["+yx", [240*px, 30*px], [1, 0]],
                        ["+yx", [-240*px, 30*px], [1, 0]],
                        ["+yx", [240*px, 30*px], [1, 0]],
                        ["+yx", [-240*px, 30*px], [1, 0]],
                        ["+yx", [240*px, 30*px], [1, 0]],
                        ["+yx", [-240*px, 30*px], [1, 0]],
                        ["+yx", [240*px, 30*px], [1, 0]],
                        ["+yz", [-240*px, lpv*layer], [1, 2]]
                        ]
            );
            routing(
                dimm = [
                        [[0, 0], [0, 14*px], [0, 10*layer]],
                        [[0, 14*px], [0, 0], [0, 10*layer]],
                        [[0, 14*px], [0, 14*px], [0, 0]]
                        ],
                p0 = [7*30*px, 0, 4*lpv*layer],
                pf = [
                        ["+yx", [240*px, -30*px], [1, 0]],
                        ["+yx", [-240*px, -30*px], [1, 0]],
                        ["+yx", [240*px, -30*px], [1, 0]],
                        ["+yx", [-240*px, -30*px], [1, 0]],
                        ["+yx", [240*px, -30*px], [1, 0]],
                        ["+yx", [-240*px, -30*px], [1, 0]],
                        ["+yx", [240*px, -30*px], [1, 0]],
                        ["+yx", [-240*px, -30*px], [1, 0]]
                        ]
            );
        }
        
    }
    
    if (orientation == "N"){
        translate([xpos*px, ypos*px, zpos*layer])
        obj();
    }
        if (orientation == "FN"){
        mirror([1, 0, 0])
        translate([-10*30*px - xpos*px, ypos*px, zpos*layer])
        obj();
    }
    if (orientation == "FS"){
        mirror([0, 1, 0])
        translate([xpos*px, -10*30*px - ypos*px, zpos*layer])
        obj();
    }
    if (orientation == "S"){
        mirror([0, 1, 0])
        mirror([1, 0, 0])
        translate([-10*30*px - xpos*px, -10*30*px - ypos*px, zpos*layer])
        obj();
    }
    
}
module diffmix_25px_0(xpos, ypos, zpos, orientation)
{
      
    // Channel Dimensions
    hchan = 10*layer;
    Wchan = 14*px;

    dim  = [
            [[0,0],[-Wchan/2,Wchan/2],[0,hchan]], // 0
            [[-Wchan/2,Wchan/2],[0,0],[0,hchan]], // 1
                    
           ];
    
    module obj(){
        pi_0 = [-7*px, 30*px, 0];
        pf_0 = [Wchan+16*px, 0, 0];
        connect_0 = [
                     ["+x", pf_0, 0]
                    ];
        routing(pi_0, connect_0, dim);
        
        pi_1 = [-7*px, 0*px, 0];
        pf_1 = [Wchan, 0, 0];
        connect_1 = [
                     ["+x", pf_1, 0]
                    ];
        routing(pi_1, connect_1, dim);

        pi_2 = [23*px, 30*px, 0];
        pf_2 = [Wchan, 0, 0];
        connect_2 = [
                     ["+x", pf_2, 0]
                    ];
        routing(pi_2, connect_2, dim);
  
        pi_3 = [0, 0, 0];
        pf_3 = [42.4*px, 0, 0];
        connect_3 = [
                     ["+x", pf_3, 0]
                    ];
        rotate(45)
        routing(pi_3, connect_3, dim);  
        
    }
    
    if (orientation == "N"){
        translate([30*px + xpos*px, 30*px + ypos*px, zpos*layer])
        obj();
    }
    if (orientation == "FN"){
        mirror()
        translate([-2*30*px - xpos*px, 30*px + ypos*px, zpos*layer])
        obj();
    }
    if (orientation == "FS"){
        mirror([0, 1, 0])
        translate([30*px + xpos*px, -2*30*px - ypos*px, zpos*layer])
        obj();
    }
    if (orientation == "S"){
        mirror()
        mirror([0, 1, 0])
        translate([-2*30*px - xpos*px, -2*30*px - ypos*px, zpos*layer])
        obj();
    }
    
}
module junction_25px_0(xpos, ypos, zpos, orientation)
{
      
    // Channel Dimensions
    hchan = 10*layer;
    Wchan = 14*px;

    dim  = [
            [[0,0],[-Wchan/2,Wchan/2],[0,hchan]], // 0
            [[-Wchan/2,Wchan/2],[0,0],[0,hchan]], // 1
                    
           ];
    
    module obj(){
        pi_0 = [-7*px, 25*px, 0];
        pf_0 = [Wchan+11*px, 0, 0];
        connect_0 = [
                     ["+x", pf_0, 0]
                    ];
        routing(pi_0, connect_0, dim);
        
        pi_1 = [-7*px, 0*px, 0];
        pf_1 = [Wchan, 0, 0];
        connect_1 = [
                     ["+x", pf_1, 0]
                    ];
        routing(pi_1, connect_1, dim);

        pi_2 = [18*px, 25*px, 0];
        pf_2 = [Wchan, 0, 0];
        connect_2 = [
                     ["+x", pf_2, 0]
                    ];
        routing(pi_2, connect_2, dim);
  
        pi_3 = [0, 0, 0];
        pf_3 = [35.4*px, 0, 0];
        connect_3 = [
                     ["+x", pf_3, 0]
                    ];
        rotate(45)
        routing(pi_3, connect_3, dim);  
        
    }
    
    if (orientation == "FN"){
        translate([25*px + xpos*px, 25*px + ypos*px, zpos*layer])
        obj();
    }
    if (orientation == "N"){
        mirror()
        translate([-2*25*px - xpos*px, 25*px + ypos*px, zpos*layer])
        obj();
    }
    if (orientation == "S"){
        mirror([0, 1, 0])
        translate([25*px + xpos*px, -2*25*px - ypos*px, zpos*layer])
        obj();
    }
    if (orientation == "FS"){
        mirror()
        mirror([0, 1, 0])
        translate([-2*25*px - xpos*px, -2*25*px - ypos*px, zpos*layer])
        obj();
    }
    
}
module marker(xpos, ypos, zpos)
{
    marker_height = 80*layer;
    marker_diameter = 200*px;
    
    module obj(){
        cylinder(h = marker_height, d = marker_diameter);
    }

    translate([xpos, ypos, zpos]){
        obj();
    }
}
module empty_obj(str_obj)
{
    
}
module pinhole_325px_0(xpos, ypos, zpos, orientation)
{
    
    // Parameters
    d_pin   = 140*px;   // ~= 106*layer = 1.06mm;
    l_pin   = 260*px;   // ~= 2.00mm
    h_cone  = 67*px;    // ~= 0.46mm
    
    module obj(){
        rotate([-90, 0, 0]){
            translate([0, 0, l_pin]){
                cylinder(h = h_cone, d1 = d_pin, d2 = 0);
            }
        cylinder(d = d_pin, h = l_pin);
        }
    }
    
    if (orientation == "bottom"){
        translate([xpos*px, ypos*px, zpos*layer + 5 * layer])
        obj();
    }
    
    if (orientation == "left"){
        rotate([0, 0, -90])
        translate([-ypos*px, xpos*px, zpos*layer + 5 * layer])
        obj();
    }
    
    if (orientation == "top"){
        rotate([0, 0, -180])
        translate([-xpos*px, -ypos*px, zpos*layer + 5 * layer])
        obj();
    }
    
    if (orientation == "right"){
        rotate([0, 0, 90])
        translate([ypos*px, -xpos*px, zpos*layer+ 5 * layer])
        obj();
    }

}
module interconnect_32channel(xpos, ypos, zpos)
{
    gasket_side_length = 40*px;
    gasket_aperture_length = 20*px;
    gasket_height = 1*layer;

    gasket_grid = [2, 2];
    block_gasket_offset = 155*px;
    block_height_default = 200*layer;
    block_long_side = 600*px;
    block_short_side = 399*px;
    gasket_offset = 50*px;

    pedestal_x = 780*px;
    pedestal_y = 380*px;
    pedestal_height = 100*px;

    channel_width_thick = 20 * px;
    channel_width_default = 12*px;

    module zchan(l, xy = channel_width_default) {
        color("lightblue")
        translate([-xy / 2, -xy / 2, 0]) {
            if (l < 0)
                mirror([0, 0, 1])
            cube([xy, xy, -l]);
            else
            cube([xy, xy, l]);
        }
    }

    module gasket(
        gasket_side_length=gasket_side_length, 
        aperture_side_length=gasket_aperture_length, 
        height=gasket_height
        ){

            gasket_width = (gasket_side_length - aperture_side_length)/2;
            difference(){
                cube([gasket_side_length, gasket_side_length, height]);
                translate([gasket_width, gasket_width, 0])
                    cube([aperture_side_length, aperture_side_length, height]);
        }
    }

    module interconnect(
        gasket_grid=gasket_grid,
        gasket_side_length=gasket_side_length, 
        aperture_side_length=gasket_aperture_length, 
        gasket_height=gasket_height,
        gasket_offset = gasket_offset,
        block_gasket_offset=block_gasket_offset,
        block_height=block_height_default,
        block_long_side=block_long_side,
        block_short_side=block_short_side,
        ccim=false, // Flag to use the CCIM type of microgasket (SIM is the default)
        for_interface_chip=false // Interface chips are printed upside down for the burning layers to not clog entrance channels, also the gasket grid is displayed transparent
        ){
        gasket_group_x_lenght = gasket_grid[1] * gasket_side_length + (gasket_grid[1]-1) * gasket_offset;
        gasket_group_y_lenght = gasket_grid[0] * gasket_side_length + (gasket_grid[0]-1) * gasket_offset;
        x_centering_offset = gasket_group_x_lenght/2;
        y_centering_offset = gasket_group_y_lenght/2;
        if (ccim){
            cube([1, 1, 1]); // This section should implement an interconnect structure that uses SSIMs instead of SIMs (see 2018 paper for reference)
        }
        else {
            flip_angle = for_interface_chip ? 180:0;
            diff_interface_blocks = for_interface_chip ? 0:50*layer;
            rotate([flip_angle, 0, 0]){
                // Gasket grid
                translate([-x_centering_offset, -y_centering_offset, 0]){
                    for (row=[0:gasket_grid[1]-1]){
                        for (col=[0:gasket_grid[0]-1]){
                            translate([(gasket_side_length + gasket_offset)*row, (gasket_side_length + gasket_offset)*col, 0])
                            if (for_interface_chip){
                                %gasket(gasket_side_length=gasket_side_length, aperture_side_length=aperture_side_length, height=gasket_height);
                            }
                            else {
                                gasket(gasket_side_length=gasket_side_length, aperture_side_length=aperture_side_length, height=gasket_height);
                            }
                        }
                    }
                }
                // Right block
                translate([x_centering_offset + block_gasket_offset, -block_long_side/2, -pedestal_height])
                    cube([block_short_side, block_long_side, block_height - diff_interface_blocks]);
                // Left block
                translate([-x_centering_offset - block_gasket_offset - block_short_side, -block_long_side/2, -pedestal_height])
                    cube([block_short_side, block_long_side, block_height - diff_interface_blocks]);
            }
        }
    }

    module corner_connections(){
        for (row=[0.5, 1.5]) {
            for (col=[-0.5, -1.5, -2.5, -3.5]) {
                x_offset_outchan = col*gasket_side_length + col*gasket_offset;
                y_offset_outchan = row*gasket_side_length + row*gasket_offset;
                translate([x_offset_outchan, y_offset_outchan, 0])
                    zchan(pedestal_height+gasket_height, xy=channel_width_thick);
            }
        }
    }

    module obj(){
        difference(){
            translate([-pedestal_x/2, -pedestal_y/2, 0])
                cube([pedestal_x, pedestal_y, pedestal_height]);
            corner_connections();
            translate([4*(gasket_side_length+gasket_offset), 0, 0]){
                corner_connections();
            }
            translate([0, -2*(gasket_side_length+gasket_offset), 0]){
                corner_connections();
            }
            translate([4*(gasket_side_length+gasket_offset), -2*(gasket_side_length+gasket_offset), 0]){
                corner_connections();
            }
        }

        translate([0, 0, pedestal_height])
            interconnect(gasket_grid=[4, 8], for_interface_chip=false);
        }

    translate([xpos*px, ypos*px, zpos*layer]){
        obj();
    }
        
}
